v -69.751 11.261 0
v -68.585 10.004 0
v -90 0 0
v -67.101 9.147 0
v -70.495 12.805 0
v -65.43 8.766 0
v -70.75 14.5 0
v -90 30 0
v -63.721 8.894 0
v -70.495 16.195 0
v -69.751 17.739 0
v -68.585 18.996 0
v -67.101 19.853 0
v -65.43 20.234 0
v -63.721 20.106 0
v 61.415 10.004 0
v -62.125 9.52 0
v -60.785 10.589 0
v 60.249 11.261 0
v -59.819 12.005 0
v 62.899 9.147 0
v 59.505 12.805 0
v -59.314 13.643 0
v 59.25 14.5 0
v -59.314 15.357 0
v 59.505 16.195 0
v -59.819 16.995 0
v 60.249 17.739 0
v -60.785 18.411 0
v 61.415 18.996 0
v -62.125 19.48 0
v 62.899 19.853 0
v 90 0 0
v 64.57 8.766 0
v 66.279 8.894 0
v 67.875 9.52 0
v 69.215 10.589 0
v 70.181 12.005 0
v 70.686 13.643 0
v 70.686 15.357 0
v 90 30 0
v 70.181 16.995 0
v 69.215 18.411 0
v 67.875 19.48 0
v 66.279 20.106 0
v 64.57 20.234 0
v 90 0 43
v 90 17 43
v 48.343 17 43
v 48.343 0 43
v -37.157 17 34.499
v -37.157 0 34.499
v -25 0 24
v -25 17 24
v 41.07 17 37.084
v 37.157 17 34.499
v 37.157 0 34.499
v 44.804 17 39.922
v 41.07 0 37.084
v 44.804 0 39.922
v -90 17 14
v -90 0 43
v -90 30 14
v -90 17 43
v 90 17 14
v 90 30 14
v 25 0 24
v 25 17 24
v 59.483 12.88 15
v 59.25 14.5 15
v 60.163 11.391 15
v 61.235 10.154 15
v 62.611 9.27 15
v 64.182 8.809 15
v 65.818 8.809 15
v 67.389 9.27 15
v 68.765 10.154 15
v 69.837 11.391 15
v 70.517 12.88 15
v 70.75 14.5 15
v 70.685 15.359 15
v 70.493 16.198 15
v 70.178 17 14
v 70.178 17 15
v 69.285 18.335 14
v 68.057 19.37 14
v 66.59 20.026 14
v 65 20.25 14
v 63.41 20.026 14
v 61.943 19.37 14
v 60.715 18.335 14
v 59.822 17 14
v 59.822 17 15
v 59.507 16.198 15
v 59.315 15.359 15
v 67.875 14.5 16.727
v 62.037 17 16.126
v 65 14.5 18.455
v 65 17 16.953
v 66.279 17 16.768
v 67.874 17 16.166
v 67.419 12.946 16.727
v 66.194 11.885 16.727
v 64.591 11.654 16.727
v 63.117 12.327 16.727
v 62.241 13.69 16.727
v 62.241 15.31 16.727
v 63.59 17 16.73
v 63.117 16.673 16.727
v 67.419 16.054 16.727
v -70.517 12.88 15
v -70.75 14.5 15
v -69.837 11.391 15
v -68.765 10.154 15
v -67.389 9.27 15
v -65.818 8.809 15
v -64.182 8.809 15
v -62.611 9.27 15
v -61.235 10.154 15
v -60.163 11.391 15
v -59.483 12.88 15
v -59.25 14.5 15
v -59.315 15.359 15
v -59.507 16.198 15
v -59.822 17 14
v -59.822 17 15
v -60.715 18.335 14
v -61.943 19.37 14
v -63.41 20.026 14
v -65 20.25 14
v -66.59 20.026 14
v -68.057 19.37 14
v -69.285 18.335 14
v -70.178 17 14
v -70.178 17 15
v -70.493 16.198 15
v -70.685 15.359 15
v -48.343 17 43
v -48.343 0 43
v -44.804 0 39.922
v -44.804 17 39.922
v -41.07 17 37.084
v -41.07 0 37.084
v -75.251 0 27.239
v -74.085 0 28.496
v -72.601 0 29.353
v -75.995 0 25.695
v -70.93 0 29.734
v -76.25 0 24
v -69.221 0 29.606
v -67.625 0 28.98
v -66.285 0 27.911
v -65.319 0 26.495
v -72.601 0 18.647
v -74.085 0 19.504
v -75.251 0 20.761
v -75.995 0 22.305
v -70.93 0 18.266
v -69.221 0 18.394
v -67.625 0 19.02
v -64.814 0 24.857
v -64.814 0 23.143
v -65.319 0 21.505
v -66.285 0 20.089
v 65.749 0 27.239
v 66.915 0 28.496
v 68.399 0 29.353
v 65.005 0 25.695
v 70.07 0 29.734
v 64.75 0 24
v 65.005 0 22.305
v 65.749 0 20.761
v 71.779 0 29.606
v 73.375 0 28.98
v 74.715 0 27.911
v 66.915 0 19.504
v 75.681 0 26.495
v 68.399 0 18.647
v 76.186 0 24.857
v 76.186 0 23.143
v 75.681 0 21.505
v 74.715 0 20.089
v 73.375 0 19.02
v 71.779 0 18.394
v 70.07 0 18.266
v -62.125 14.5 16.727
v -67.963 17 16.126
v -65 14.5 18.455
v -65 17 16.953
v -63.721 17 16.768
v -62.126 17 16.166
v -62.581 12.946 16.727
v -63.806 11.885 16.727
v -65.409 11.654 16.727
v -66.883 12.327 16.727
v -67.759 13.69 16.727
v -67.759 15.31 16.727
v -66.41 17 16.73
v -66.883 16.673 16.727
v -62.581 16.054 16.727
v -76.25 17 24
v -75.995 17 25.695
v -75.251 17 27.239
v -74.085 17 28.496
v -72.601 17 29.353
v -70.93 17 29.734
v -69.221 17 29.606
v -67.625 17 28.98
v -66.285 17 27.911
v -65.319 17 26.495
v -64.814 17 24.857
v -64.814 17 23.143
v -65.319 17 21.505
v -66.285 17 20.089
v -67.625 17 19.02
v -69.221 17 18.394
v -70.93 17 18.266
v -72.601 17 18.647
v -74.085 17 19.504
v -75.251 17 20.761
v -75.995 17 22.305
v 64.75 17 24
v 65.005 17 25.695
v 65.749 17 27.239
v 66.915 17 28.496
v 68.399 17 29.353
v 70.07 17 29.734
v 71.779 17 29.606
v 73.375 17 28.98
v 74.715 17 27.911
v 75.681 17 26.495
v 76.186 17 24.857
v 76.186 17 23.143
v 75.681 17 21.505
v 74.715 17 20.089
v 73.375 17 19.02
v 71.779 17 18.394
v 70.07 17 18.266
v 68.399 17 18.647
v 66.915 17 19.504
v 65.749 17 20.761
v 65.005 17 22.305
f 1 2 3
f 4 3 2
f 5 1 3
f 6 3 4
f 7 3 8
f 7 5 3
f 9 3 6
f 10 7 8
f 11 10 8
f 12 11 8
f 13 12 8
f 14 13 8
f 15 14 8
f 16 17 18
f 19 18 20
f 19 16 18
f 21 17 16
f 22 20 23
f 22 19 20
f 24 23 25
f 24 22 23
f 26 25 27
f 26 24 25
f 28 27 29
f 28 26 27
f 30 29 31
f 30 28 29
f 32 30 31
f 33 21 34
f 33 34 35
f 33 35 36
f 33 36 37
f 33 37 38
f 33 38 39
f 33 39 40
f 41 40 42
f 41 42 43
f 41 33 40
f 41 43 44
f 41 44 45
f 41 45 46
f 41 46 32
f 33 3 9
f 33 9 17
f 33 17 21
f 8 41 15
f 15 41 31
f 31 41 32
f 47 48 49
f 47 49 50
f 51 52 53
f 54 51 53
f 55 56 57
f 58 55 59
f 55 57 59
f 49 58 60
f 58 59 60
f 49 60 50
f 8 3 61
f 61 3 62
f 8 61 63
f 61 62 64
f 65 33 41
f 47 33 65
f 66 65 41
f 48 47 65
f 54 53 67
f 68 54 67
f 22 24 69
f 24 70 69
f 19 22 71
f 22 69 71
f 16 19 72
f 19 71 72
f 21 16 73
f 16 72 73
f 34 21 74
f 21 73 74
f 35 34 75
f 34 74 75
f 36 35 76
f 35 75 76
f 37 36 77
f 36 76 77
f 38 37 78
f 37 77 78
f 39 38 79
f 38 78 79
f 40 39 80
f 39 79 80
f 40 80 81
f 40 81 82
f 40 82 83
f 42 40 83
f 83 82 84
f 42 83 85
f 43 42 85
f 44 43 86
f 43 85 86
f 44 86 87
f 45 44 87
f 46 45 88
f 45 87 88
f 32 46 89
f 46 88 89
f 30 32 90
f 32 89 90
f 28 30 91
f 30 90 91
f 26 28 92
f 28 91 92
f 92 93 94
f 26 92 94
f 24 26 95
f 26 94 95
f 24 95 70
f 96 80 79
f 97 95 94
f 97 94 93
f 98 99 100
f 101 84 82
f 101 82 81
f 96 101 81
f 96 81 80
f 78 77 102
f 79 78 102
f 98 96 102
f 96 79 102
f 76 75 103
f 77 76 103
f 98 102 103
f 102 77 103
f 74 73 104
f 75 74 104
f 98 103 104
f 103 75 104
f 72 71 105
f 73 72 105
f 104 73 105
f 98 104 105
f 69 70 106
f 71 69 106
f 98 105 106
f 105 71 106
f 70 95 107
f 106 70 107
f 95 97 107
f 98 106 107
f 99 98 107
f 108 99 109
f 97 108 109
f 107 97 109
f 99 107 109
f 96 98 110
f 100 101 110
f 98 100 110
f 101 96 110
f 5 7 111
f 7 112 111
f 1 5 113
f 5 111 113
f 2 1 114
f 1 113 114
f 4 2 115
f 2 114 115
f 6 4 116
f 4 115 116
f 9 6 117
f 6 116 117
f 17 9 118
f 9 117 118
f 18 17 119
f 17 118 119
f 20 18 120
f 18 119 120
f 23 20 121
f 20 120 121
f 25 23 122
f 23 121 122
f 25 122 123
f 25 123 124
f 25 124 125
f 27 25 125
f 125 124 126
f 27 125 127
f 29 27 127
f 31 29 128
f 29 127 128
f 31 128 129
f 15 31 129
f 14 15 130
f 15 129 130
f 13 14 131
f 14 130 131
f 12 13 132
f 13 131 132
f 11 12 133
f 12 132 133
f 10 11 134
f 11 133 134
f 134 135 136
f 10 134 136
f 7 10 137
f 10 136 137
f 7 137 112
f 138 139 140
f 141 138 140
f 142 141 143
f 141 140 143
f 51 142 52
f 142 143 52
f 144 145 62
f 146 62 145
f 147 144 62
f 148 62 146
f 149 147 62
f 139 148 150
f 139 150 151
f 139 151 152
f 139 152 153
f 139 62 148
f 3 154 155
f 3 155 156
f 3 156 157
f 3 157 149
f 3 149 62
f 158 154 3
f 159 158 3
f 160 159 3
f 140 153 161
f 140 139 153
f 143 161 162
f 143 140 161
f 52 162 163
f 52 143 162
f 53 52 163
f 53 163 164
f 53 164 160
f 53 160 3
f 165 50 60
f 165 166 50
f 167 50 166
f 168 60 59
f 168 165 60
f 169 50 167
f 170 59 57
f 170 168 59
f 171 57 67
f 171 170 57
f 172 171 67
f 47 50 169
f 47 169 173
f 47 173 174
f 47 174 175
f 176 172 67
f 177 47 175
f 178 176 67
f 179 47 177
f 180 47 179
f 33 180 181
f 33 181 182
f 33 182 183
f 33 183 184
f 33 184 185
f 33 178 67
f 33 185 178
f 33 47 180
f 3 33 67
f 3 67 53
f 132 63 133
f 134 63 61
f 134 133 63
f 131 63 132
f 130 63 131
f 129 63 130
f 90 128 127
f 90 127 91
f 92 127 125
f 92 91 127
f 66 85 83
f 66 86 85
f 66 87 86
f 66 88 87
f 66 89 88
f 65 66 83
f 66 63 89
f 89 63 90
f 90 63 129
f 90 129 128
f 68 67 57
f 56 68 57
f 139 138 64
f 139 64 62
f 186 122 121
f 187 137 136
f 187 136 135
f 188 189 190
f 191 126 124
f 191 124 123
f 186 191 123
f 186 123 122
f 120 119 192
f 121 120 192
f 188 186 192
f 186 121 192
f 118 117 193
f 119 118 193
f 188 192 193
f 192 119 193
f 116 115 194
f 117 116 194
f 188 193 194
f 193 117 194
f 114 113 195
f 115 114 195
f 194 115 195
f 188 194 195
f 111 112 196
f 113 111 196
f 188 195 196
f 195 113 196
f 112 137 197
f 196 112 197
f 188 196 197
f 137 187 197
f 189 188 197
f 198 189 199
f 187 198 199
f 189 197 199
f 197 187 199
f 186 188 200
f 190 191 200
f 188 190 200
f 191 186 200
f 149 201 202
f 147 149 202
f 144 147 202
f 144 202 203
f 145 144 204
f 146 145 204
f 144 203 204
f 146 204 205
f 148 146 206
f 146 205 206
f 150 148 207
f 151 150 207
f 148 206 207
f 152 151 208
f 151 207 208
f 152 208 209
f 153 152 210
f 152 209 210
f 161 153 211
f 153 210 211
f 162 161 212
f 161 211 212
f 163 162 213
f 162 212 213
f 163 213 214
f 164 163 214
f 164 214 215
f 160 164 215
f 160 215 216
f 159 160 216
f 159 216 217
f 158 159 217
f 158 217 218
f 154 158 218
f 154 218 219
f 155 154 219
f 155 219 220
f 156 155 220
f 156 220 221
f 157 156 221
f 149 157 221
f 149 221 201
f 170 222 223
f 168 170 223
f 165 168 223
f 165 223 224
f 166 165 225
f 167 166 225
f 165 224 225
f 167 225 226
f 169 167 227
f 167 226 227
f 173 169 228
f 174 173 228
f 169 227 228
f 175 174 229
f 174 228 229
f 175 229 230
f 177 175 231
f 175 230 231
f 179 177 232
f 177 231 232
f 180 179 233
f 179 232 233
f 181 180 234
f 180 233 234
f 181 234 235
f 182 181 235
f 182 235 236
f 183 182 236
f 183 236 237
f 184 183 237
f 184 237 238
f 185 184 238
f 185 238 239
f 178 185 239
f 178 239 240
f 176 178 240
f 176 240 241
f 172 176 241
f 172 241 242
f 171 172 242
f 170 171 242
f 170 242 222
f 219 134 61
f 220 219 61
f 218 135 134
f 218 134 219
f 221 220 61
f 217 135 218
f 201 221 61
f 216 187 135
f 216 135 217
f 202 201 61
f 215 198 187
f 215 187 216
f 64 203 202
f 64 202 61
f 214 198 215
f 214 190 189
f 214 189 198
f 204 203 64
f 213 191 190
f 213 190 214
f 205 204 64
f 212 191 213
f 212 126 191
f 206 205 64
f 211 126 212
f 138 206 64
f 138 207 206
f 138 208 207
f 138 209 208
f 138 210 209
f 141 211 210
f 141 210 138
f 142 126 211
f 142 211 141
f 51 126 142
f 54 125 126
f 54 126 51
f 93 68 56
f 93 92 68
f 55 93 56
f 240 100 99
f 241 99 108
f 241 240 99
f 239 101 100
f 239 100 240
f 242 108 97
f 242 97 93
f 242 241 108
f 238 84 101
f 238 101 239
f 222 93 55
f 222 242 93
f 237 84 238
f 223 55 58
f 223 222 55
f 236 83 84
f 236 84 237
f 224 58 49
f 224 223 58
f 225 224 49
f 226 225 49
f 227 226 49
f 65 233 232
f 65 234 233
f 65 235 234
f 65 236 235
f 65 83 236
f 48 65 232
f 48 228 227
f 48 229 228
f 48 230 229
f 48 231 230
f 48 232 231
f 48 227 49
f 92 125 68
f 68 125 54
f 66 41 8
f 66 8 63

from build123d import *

# Parameters (mm, degrees)
F1_DEPTH = 90
F3_D     = 11.5
F3_DEPTH = 15
F3_TIP   = 3.4549485594
F5_DEPTH = 30.001
F7_D     = 11.5
F9_DEPTH = 30.001


with BuildPart() as f1:
    # F0 (on Right) → F1 (new body, symmetric)
    with BuildSketch(Plane.YZ):
        Polygon((0, 43), (0, 0), (30, 0), (30, 14), (17, 14), (17, 43), align=None)
    extrude(amount=F1_DEPTH, both=True)

    # F3
    with Locations(Plane(origin=(0, 0, 0), x_dir=(1, 0, 0), z_dir=(0, 0, -1))):
        with Locations((65, -14.5), (-65, -14.5)):
            Hole(F3_D / 2, depth=F3_DEPTH)
            with Locations((0, 0, -(F3_DEPTH + F3_TIP / 2))):  # 118° drill point
                Cone(0, F3_D / 2, F3_TIP, mode=Mode.SUBTRACT)

    # F4 (on face) → F5 (cut, through all)
    with BuildSketch(Plane.XZ):
        with BuildLine():
            Line((48.3425278611, 43), (-48.3425278611, 43))
            ThreePointArc((-48.3425278611, 43), (0, 24), (48.3425278611, 43))
        make_face()
    extrude(amount=-F5_DEPTH, mode=Mode.SUBTRACT)

    # F7 (through all)
    with Locations(Plane.XZ):
        with Locations((-70.5, 24), (70.5, 24)):
            Hole(F7_D / 2)

    # F8 (on face) → F9 (cut, through all)
    with BuildSketch(Plane.XZ):
        with BuildLine():
            Line((0, 43), (-47, 43))
            Line((-47, 43), (-37.1565411971, 34.4988310339))
            ThreePointArc((-37.1565411971, 34.4988310339), (-19.305659836, 26.6751033788), (0, 24))
            Line((0, 24), (0, 43))
        make_face()
        with BuildLine():
            ThreePointArc((0, 24), (-19.305659836, 26.6751033788), (-37.1565411971, 34.4988310339))
            Line((-37.1565411971, 34.4988310339), (-25, 24))
            Line((-25, 24), (0, 24))
        make_face()
        with BuildLine():
            Line((47, 43), (0, 43))
            Line((0, 43), (0, 24))
            ThreePointArc((0, 24), (19.305659836, 26.6751033788), (37.1565411971, 34.4988310339))
            Line((37.1565411971, 34.4988310339), (47, 43))
        make_face()
        with BuildLine():
            ThreePointArc((37.1565411971, 34.4988310339), (19.305659836, 26.6751033788), (0, 24))
            Line((0, 24), (25, 24))
            Line((25, 24), (37.1565411971, 34.4988310339))
        make_face()
    extrude(amount=-F9_DEPTH, mode=Mode.SUBTRACT)


solid = f1.part
